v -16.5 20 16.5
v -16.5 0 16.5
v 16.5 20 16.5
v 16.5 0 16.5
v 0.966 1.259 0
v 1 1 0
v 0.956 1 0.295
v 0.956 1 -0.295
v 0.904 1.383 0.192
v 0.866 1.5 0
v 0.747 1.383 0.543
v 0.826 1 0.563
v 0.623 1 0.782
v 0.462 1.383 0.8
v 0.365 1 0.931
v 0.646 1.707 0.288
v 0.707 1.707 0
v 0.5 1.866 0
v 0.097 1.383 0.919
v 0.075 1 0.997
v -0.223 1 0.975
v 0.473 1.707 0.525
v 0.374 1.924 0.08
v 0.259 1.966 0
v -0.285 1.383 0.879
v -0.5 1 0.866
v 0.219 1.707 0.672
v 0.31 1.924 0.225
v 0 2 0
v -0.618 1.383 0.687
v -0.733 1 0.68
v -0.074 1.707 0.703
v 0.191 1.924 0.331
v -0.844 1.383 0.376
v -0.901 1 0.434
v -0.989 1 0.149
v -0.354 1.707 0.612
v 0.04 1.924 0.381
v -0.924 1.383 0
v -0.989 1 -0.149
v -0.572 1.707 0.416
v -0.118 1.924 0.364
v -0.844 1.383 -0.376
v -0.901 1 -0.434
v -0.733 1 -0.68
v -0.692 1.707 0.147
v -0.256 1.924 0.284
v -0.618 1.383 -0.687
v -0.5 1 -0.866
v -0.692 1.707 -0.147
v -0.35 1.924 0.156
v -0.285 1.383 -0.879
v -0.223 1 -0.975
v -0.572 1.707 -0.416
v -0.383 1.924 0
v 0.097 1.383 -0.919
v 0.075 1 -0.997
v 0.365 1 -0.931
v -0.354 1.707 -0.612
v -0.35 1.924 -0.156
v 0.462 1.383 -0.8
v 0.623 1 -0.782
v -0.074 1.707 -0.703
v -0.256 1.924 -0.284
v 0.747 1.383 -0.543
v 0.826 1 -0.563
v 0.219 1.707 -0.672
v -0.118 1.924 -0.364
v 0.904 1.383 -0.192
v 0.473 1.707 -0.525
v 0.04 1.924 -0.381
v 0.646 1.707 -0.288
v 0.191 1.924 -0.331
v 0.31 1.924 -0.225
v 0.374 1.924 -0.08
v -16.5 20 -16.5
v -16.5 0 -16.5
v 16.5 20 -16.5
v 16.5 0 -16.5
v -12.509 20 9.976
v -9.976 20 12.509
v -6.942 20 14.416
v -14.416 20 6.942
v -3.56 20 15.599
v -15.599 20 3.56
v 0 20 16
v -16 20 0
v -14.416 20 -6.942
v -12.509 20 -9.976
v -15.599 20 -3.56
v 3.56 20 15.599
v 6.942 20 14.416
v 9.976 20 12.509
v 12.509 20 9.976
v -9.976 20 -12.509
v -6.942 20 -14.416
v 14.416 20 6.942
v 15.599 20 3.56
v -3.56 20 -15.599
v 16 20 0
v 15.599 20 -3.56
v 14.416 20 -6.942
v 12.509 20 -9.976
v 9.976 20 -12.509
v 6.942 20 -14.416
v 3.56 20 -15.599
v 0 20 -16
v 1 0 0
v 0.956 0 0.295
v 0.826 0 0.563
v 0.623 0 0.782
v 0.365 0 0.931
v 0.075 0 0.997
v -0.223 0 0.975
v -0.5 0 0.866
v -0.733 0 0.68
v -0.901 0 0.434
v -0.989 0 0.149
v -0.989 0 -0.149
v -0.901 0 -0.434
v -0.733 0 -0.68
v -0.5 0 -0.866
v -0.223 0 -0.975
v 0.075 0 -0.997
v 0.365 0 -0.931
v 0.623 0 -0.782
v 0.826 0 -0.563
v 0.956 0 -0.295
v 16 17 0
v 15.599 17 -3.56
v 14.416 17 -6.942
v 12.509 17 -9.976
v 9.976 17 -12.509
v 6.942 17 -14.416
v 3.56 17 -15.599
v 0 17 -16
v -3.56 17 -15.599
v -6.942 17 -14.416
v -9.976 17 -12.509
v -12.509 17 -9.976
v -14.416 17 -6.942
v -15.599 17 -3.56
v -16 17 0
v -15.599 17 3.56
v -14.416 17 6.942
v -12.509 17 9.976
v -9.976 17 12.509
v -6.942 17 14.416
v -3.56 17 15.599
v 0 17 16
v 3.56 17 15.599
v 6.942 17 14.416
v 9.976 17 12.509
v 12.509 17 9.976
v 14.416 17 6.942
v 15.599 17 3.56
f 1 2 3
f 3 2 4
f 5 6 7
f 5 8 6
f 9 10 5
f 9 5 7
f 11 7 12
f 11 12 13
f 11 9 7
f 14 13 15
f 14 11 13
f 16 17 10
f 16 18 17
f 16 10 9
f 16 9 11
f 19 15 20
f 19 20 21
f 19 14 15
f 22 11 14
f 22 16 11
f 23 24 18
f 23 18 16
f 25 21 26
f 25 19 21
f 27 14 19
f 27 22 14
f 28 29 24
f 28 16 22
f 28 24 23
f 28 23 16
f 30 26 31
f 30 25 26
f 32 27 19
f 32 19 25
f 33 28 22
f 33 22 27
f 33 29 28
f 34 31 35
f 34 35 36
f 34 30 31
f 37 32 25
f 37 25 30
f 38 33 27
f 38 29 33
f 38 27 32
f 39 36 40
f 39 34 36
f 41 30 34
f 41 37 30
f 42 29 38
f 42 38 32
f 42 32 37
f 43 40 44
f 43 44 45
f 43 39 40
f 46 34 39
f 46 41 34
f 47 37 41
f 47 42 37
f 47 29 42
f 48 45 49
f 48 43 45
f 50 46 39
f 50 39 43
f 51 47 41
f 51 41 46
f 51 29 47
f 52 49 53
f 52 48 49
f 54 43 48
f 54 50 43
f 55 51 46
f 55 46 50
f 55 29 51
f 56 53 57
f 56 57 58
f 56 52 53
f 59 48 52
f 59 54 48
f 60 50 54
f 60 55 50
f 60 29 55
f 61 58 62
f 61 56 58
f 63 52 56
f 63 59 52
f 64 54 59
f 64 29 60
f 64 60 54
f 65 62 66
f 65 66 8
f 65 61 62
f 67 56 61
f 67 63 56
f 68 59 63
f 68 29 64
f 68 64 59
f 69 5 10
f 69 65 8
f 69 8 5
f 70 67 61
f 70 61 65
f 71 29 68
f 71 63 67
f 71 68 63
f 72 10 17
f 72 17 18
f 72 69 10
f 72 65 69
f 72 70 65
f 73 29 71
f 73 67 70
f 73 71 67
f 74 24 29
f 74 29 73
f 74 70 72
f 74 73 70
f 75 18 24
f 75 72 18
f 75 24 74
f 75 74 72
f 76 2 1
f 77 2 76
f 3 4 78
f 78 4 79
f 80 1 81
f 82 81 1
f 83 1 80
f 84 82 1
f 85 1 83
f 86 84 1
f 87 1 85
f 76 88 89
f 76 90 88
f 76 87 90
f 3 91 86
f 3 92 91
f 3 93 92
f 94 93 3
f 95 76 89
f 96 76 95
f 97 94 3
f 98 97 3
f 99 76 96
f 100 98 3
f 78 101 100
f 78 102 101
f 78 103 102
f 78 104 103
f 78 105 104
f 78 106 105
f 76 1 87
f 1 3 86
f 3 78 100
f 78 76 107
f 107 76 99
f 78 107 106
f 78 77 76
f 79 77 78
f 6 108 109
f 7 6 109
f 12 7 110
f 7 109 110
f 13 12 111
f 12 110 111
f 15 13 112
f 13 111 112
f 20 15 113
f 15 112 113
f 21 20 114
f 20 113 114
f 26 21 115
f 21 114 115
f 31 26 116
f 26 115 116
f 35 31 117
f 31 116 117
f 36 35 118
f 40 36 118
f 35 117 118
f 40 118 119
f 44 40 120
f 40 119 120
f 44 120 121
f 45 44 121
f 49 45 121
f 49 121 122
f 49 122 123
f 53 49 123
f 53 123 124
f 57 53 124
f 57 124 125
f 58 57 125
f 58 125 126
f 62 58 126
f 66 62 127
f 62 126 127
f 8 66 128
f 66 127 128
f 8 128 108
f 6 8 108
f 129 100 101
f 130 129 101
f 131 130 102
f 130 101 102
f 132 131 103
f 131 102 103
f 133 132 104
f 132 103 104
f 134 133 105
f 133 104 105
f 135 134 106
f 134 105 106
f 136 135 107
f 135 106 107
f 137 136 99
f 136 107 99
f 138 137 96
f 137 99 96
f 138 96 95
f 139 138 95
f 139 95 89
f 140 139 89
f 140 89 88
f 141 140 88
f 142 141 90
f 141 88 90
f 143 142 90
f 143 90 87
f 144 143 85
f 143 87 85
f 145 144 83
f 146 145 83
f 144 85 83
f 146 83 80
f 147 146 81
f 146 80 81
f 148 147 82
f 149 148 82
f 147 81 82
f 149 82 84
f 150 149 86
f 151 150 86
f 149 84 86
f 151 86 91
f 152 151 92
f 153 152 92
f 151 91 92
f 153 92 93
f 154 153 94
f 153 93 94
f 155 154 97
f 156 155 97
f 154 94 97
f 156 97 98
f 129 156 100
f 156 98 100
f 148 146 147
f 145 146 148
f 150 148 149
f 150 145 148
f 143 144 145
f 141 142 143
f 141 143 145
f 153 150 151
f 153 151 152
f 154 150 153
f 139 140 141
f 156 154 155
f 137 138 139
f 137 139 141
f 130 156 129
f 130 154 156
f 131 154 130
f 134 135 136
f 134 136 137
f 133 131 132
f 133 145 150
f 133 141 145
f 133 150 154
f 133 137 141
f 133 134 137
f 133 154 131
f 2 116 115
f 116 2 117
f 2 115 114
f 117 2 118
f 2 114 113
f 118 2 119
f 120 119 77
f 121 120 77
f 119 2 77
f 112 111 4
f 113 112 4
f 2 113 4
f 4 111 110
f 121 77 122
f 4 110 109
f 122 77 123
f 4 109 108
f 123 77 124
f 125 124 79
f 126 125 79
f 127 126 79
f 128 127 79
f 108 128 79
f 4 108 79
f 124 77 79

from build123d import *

# Parameters (mm, degrees)
SKETCH1_W           = 33
SKETCH1_H           = 33
BOSS_EXTRUDE1_DEPTH = 20
SKETCH2_R           = 16
CUT_EXTRUDE1_DEPTH  = 3
SKETCH3_R           = 1
CUT_EXTRUDE2_DEPTH  = 2
FILLET1_R           = 1


with BuildPart() as part:
    # Sketch1 → Boss-Extrude1 (new body)
    with BuildSketch(Plane(origin=(0, 0, 0), x_dir=(1, 0, 0), z_dir=(0, 1, 0))):
        Rectangle(SKETCH1_W, SKETCH1_H)
    extrude(amount=BOSS_EXTRUDE1_DEPTH)

    # Sketch2 → Cut-Extrude1 (cut)
    with BuildSketch(Plane(origin=(0, 20, 0), x_dir=(1, 0, 0), z_dir=(0, 1, 0))):
        Circle(SKETCH2_R)
    extrude(amount=-CUT_EXTRUDE1_DEPTH, mode=Mode.SUBTRACT)

    # Sketch3 → Cut-Extrude2 (cut)
    with BuildSketch(Plane.XZ):
        Circle(SKETCH3_R)
    extrude(amount=-CUT_EXTRUDE2_DEPTH, mode=Mode.SUBTRACT)

    # Fillet1
    fillet1_edges = [part.edges().sort_by_distance(p)[0] for p in [
        (-1, 2, 0),
    ]]
    fillet(fillet1_edges, radius=FILLET1_R)


solid = part.part
